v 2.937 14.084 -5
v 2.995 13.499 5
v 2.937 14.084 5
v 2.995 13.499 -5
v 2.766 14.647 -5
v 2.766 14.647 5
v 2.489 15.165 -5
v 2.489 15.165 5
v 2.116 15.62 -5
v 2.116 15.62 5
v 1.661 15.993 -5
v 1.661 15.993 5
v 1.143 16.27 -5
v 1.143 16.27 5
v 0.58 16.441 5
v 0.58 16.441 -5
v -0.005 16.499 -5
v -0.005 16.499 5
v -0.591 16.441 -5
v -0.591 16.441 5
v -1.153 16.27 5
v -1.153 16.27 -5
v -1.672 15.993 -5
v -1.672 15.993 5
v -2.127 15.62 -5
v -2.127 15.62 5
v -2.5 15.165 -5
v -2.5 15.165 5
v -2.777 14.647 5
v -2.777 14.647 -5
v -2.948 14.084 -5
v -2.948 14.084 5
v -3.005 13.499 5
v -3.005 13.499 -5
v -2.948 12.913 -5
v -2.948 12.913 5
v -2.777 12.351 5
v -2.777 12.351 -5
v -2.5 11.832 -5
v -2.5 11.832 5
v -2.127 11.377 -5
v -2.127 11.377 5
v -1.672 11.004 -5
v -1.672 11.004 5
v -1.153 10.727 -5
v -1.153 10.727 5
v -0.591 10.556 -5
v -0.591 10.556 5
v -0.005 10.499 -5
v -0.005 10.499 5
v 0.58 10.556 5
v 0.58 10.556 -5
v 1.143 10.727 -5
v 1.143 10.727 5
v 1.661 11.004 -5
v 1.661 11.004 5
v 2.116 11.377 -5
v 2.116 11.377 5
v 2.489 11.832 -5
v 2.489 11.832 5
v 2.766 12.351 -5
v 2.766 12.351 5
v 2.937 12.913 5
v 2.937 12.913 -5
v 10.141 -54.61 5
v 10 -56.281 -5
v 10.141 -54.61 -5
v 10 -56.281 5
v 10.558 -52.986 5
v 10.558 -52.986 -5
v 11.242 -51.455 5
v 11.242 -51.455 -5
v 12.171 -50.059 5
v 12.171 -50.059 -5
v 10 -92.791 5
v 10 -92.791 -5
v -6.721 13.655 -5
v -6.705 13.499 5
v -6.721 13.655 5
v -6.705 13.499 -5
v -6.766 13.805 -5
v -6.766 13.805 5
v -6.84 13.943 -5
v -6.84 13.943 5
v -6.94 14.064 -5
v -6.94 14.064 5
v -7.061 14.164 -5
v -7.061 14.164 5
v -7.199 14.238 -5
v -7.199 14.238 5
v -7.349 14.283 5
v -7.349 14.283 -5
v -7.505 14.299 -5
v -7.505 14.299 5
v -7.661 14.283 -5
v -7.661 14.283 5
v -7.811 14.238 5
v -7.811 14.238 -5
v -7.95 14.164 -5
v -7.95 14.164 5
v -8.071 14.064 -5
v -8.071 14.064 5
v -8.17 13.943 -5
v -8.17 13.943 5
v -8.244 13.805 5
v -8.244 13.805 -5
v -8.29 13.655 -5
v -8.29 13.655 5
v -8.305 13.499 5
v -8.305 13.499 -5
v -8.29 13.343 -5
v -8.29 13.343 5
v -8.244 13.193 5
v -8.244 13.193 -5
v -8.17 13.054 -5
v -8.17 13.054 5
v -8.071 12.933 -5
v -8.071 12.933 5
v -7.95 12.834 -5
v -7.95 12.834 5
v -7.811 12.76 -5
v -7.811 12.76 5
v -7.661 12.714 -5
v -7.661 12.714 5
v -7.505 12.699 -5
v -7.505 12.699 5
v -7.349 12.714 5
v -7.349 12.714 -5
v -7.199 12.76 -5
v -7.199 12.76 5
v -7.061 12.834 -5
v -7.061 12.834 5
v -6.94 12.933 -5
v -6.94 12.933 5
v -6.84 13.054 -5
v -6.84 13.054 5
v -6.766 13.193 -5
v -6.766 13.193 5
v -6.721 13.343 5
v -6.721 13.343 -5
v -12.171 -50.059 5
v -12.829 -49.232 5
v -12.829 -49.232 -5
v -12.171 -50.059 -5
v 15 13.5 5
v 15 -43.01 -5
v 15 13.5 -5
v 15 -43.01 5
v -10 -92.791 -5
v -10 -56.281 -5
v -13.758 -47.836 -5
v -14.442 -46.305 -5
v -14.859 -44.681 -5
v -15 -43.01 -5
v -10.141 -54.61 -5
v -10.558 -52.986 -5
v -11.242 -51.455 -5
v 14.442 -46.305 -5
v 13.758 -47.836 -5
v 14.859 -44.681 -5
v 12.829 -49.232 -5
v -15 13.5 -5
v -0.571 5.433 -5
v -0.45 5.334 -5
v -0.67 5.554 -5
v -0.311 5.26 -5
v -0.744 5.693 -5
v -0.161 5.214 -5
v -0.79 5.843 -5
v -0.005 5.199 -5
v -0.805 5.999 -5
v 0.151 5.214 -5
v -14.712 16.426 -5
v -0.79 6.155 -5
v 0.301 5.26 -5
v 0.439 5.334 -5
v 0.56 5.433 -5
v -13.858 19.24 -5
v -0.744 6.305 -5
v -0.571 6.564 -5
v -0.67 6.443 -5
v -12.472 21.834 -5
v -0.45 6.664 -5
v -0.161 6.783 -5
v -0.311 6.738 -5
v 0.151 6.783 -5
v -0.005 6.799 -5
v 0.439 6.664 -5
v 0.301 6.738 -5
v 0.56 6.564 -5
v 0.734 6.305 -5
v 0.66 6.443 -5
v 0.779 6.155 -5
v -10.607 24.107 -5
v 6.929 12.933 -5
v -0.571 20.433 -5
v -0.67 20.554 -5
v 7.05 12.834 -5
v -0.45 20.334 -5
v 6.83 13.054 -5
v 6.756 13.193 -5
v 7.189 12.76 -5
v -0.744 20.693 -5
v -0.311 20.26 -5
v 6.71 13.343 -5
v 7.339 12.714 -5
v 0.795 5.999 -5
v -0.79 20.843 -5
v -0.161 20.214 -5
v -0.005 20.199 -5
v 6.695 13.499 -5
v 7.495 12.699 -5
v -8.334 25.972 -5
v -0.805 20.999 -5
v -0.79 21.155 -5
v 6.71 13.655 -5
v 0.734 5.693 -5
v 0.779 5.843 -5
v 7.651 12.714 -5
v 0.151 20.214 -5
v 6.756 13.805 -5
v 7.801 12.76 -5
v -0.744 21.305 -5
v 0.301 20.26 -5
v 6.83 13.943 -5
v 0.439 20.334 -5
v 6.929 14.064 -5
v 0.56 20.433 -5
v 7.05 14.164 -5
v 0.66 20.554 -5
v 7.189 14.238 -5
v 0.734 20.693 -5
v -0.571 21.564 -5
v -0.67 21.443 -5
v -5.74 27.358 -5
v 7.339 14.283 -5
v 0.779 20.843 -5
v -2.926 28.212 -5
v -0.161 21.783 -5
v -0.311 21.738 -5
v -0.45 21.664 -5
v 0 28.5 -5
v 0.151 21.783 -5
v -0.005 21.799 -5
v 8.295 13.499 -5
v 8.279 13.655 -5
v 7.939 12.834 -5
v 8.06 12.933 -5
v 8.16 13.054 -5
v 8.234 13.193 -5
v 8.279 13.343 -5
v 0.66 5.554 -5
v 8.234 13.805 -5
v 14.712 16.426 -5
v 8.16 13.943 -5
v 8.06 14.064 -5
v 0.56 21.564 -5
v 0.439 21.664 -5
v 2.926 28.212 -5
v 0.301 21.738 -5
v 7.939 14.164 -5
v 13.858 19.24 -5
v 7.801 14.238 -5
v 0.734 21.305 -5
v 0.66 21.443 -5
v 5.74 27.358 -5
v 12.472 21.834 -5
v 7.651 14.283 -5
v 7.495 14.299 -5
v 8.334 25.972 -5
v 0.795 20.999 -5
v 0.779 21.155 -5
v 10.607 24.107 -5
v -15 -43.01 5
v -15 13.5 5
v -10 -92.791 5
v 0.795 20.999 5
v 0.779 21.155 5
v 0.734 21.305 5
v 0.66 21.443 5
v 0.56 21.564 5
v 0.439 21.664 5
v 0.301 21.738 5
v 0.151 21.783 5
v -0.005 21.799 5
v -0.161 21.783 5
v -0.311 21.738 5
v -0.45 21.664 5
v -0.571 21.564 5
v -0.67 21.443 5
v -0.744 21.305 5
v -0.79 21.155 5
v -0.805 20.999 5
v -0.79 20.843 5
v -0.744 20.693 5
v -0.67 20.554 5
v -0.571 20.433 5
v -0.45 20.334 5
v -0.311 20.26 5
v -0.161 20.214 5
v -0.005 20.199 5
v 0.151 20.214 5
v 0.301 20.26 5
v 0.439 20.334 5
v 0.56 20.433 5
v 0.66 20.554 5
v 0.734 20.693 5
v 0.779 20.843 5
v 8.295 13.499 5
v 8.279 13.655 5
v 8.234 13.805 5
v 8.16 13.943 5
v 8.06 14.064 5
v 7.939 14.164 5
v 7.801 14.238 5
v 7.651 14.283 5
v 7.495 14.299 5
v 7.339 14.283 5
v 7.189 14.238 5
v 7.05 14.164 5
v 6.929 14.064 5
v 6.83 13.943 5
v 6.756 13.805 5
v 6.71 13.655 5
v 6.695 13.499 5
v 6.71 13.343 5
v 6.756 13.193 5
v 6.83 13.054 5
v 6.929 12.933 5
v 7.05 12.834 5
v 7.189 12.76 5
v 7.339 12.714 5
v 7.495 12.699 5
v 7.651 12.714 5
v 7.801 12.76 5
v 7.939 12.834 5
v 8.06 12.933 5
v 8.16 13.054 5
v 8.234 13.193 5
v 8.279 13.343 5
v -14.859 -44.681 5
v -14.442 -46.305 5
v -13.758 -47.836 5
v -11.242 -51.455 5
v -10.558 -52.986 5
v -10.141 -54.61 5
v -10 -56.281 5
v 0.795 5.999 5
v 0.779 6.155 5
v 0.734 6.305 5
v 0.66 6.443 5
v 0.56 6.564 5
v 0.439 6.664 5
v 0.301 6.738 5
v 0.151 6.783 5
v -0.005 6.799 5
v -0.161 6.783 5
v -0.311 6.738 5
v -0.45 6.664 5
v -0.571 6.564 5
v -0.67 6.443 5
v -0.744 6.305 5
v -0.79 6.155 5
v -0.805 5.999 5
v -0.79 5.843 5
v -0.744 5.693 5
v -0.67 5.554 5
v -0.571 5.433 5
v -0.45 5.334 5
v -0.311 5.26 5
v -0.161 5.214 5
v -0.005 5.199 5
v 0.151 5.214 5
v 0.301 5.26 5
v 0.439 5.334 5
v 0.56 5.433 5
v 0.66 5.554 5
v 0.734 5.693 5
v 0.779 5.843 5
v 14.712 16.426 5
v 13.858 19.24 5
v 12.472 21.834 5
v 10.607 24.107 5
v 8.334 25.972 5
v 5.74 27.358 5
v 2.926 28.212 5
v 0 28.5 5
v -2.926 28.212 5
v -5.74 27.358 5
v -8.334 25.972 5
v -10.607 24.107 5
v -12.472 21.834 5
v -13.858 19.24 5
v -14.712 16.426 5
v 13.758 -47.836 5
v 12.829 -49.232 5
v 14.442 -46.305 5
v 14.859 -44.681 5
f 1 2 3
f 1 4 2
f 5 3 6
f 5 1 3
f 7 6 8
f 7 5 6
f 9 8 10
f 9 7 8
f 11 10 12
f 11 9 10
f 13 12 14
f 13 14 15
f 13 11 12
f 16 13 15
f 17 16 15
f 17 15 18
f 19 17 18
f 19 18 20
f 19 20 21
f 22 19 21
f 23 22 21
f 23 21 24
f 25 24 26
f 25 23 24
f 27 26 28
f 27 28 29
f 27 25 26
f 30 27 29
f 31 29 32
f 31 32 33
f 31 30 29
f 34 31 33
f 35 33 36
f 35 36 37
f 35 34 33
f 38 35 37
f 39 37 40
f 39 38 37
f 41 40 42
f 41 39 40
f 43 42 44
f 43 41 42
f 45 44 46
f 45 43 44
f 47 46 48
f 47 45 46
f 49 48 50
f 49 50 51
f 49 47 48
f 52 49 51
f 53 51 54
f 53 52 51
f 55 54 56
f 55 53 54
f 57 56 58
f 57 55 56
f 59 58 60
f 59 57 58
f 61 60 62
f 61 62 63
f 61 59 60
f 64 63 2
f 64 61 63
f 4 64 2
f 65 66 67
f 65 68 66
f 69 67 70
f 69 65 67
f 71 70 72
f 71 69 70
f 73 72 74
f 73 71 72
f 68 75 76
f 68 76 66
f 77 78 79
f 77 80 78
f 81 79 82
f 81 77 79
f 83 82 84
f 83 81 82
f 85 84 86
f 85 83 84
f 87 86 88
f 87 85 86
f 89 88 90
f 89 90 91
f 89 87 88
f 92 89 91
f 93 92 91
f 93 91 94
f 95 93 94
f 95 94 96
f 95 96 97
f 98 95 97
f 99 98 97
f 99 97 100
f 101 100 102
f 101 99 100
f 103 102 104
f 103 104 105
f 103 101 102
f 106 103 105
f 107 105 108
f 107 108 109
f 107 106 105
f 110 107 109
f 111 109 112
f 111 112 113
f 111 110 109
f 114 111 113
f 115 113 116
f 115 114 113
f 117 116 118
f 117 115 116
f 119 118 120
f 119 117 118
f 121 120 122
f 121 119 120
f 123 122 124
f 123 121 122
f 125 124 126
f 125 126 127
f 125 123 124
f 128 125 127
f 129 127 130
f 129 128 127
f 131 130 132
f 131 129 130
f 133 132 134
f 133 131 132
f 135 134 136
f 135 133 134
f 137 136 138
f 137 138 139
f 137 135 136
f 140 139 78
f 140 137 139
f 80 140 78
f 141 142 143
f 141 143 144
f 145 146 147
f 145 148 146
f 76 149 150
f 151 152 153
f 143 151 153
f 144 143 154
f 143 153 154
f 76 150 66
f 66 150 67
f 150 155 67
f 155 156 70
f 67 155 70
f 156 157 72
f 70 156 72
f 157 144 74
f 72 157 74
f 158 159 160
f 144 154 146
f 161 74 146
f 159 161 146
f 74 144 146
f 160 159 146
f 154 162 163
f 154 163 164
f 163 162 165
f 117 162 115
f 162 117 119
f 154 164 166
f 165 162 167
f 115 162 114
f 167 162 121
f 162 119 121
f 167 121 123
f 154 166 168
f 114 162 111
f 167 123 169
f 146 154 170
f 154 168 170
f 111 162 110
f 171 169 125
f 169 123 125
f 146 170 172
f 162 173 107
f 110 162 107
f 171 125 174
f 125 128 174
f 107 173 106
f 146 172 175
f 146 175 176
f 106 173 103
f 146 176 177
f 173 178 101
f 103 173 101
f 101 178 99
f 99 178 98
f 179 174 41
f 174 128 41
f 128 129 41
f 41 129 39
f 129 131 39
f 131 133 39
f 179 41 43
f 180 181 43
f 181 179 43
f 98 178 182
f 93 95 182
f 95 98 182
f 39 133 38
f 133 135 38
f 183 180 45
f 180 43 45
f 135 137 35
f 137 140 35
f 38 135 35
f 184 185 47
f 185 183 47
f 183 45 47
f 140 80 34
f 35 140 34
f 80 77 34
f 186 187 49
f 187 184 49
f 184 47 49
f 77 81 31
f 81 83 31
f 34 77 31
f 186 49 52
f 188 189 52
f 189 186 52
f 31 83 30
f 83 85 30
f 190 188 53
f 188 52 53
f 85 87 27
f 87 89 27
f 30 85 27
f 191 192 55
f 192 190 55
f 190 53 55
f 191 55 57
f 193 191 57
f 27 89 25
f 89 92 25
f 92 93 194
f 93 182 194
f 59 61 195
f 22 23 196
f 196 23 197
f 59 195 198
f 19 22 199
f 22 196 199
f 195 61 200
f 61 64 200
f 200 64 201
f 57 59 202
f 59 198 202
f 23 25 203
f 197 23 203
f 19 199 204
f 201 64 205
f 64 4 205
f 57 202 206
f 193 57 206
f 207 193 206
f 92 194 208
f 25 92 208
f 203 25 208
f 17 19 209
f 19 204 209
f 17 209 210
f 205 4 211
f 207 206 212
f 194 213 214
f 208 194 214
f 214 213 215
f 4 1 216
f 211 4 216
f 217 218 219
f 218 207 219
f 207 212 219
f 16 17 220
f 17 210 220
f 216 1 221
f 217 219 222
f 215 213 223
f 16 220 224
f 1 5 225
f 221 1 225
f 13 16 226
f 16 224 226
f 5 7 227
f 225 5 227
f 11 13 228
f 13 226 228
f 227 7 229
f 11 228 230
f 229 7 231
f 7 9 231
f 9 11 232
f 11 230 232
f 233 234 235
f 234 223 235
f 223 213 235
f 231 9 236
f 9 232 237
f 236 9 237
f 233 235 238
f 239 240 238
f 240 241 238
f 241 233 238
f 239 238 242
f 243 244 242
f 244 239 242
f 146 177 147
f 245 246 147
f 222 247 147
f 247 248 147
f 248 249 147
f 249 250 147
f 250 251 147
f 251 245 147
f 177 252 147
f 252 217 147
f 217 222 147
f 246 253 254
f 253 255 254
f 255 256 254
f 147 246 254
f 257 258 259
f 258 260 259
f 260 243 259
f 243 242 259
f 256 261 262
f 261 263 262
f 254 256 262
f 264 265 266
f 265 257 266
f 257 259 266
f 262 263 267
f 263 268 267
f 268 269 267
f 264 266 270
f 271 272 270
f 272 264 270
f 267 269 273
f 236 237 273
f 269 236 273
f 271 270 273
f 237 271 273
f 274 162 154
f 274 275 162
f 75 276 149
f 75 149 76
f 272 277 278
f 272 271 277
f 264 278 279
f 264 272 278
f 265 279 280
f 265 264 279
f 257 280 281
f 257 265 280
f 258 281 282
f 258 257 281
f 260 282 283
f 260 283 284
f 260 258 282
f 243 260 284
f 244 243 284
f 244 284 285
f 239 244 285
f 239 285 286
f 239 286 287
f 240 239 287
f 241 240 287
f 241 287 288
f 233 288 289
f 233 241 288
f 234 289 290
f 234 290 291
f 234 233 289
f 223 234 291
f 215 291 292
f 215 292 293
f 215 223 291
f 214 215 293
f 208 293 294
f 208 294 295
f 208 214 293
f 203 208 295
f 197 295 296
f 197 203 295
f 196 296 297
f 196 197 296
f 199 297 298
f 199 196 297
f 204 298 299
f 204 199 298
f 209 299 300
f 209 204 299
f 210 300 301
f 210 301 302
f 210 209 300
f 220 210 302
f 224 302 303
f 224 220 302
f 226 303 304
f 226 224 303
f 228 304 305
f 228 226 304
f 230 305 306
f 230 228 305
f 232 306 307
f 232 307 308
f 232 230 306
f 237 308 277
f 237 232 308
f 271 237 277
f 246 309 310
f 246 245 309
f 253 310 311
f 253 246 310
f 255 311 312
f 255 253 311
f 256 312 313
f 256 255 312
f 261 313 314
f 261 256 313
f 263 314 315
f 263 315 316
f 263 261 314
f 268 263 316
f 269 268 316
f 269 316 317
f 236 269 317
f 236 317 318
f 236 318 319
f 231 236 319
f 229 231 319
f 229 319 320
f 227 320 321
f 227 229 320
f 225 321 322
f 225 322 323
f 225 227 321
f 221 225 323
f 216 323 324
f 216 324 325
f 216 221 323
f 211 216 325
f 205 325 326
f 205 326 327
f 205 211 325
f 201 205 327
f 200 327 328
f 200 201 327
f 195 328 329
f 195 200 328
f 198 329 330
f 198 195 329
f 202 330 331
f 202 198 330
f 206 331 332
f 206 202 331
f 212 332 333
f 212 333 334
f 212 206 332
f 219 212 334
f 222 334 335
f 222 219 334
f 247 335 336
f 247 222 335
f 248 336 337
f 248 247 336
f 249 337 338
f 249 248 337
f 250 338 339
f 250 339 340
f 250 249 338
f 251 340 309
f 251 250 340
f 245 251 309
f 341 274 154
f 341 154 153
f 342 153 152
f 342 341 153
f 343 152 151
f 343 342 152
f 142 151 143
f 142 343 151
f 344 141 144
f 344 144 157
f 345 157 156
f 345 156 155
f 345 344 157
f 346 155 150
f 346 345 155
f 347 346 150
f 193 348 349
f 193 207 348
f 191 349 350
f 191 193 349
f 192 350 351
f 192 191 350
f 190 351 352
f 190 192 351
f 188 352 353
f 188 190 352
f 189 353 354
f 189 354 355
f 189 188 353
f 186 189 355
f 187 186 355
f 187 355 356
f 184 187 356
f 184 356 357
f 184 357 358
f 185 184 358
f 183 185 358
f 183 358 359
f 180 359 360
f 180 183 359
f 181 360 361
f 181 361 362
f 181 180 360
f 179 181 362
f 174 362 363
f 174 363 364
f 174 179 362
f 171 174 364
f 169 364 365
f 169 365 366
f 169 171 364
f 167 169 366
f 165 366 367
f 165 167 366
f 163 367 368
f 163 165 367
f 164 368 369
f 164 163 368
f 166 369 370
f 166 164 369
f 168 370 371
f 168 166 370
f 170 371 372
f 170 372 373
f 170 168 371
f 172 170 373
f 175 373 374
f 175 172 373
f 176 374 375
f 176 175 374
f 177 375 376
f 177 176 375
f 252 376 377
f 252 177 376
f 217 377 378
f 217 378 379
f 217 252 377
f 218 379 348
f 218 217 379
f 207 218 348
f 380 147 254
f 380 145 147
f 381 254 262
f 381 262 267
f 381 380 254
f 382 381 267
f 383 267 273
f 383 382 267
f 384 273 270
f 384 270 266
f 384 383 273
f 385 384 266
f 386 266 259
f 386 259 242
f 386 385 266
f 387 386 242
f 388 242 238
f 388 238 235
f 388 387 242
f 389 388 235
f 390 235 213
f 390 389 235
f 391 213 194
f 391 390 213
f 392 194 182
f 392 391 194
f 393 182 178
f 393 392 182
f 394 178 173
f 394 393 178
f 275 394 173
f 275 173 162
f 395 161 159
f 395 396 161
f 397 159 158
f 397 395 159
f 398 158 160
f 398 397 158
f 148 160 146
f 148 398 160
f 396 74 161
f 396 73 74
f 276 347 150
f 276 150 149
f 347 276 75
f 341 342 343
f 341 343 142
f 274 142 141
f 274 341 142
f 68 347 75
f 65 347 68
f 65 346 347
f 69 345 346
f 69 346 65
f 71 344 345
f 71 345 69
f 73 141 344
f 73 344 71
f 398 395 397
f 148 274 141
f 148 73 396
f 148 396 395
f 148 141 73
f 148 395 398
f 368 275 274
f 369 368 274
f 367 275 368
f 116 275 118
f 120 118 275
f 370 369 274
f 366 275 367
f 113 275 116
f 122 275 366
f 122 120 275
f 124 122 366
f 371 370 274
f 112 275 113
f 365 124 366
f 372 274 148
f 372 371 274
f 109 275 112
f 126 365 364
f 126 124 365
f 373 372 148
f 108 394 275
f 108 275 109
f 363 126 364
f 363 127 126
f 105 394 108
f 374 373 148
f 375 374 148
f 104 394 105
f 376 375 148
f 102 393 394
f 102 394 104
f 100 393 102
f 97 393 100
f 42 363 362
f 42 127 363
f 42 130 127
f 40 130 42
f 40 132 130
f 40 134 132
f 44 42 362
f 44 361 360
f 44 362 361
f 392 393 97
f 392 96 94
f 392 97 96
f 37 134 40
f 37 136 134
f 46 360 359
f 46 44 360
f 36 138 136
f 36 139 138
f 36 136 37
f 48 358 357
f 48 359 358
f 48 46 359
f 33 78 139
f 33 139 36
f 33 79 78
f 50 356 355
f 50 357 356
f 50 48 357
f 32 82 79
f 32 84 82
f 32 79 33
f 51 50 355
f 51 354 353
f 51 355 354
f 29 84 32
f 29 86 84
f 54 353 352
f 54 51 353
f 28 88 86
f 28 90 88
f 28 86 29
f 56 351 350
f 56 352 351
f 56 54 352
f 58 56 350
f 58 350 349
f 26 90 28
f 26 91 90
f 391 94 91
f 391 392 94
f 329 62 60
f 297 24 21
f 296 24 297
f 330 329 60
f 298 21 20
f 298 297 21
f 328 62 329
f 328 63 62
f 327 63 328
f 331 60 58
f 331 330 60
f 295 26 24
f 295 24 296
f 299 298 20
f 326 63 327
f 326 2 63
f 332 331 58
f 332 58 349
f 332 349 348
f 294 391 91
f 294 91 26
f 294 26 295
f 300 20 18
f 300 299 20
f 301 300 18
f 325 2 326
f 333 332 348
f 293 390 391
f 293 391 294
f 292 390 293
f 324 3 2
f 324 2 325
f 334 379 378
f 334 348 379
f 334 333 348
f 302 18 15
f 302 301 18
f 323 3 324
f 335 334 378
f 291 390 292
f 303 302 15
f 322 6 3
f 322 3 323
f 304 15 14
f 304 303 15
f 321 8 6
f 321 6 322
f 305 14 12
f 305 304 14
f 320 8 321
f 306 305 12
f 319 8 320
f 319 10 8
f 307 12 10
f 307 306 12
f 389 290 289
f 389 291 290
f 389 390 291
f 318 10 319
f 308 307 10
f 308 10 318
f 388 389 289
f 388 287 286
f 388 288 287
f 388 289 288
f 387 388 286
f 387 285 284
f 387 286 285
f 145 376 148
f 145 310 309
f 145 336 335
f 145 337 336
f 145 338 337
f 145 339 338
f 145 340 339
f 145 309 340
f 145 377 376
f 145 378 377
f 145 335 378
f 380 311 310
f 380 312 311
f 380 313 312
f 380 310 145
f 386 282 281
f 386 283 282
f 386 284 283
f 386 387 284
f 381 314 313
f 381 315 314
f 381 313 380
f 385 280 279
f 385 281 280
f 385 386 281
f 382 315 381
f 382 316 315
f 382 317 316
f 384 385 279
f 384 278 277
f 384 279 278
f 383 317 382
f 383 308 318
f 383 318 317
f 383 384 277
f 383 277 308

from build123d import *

# Parameters (mm, degrees)
ESQUISSE1_R        = 0.8
ESQUISSE1_R_2      = 3
BOSS_EXTRU_1_DEPTH = 5


with BuildPart() as part:
    # Esquisse1 → Boss.-Extru.1 (new, symmetric)
    with BuildSketch(Plane.XY):
        with BuildLine():
            Line((-15, 13.5), (-15, -43.010256567))
            ThreePointArc((-15, -43.010256567), (-14.441599081, -46.305132406), (-12.828758641, -49.232035906))
            Line((-12.828758641, -49.232035906), (-12.171241359, -50.059378669))
            ThreePointArc((-12.171241359, -50.059378669), (-10.558400919, -52.986282168), (-10, -56.281158007))
            Line((-10, -56.281158007), (-10, -92.791414574))
            Line((-10, -92.791414574), (10, -92.791414574))
            Line((10, -92.791414574), (10, -56.281158007))
            ThreePointArc((10, -56.281158007), (10.558400919, -52.986282168), (12.171241359, -50.059378669))
            Line((12.171241359, -50.059378669), (12.828758641, -49.232035906))
            ThreePointArc((12.828758641, -49.232035906), (14.441599081, -46.305132406), (15, -43.010256567))
            Line((15, -43.010256567), (15, 13.5))
            ThreePointArc((15, 13.5), (0, 28.5), (-15, 13.5))
        make_face()
        with Locations((-0.005270268, 5.998754805)):
            Circle(ESQUISSE1_R, mode=Mode.SUBTRACT)
        with Locations((-7.505270268, 13.498754805)):
            Circle(ESQUISSE1_R, mode=Mode.SUBTRACT)
        with Locations((-0.005270268, 20.998754805)):
            Circle(ESQUISSE1_R, mode=Mode.SUBTRACT)
        with Locations((7.494729732, 13.498754805)):
            Circle(ESQUISSE1_R, mode=Mode.SUBTRACT)
        with Locations((-0.005270268, 13.498754805)):
            Circle(ESQUISSE1_R_2, mode=Mode.SUBTRACT)
    extrude(amount=BOSS_EXTRU_1_DEPTH, both=True)


solid = part.part
